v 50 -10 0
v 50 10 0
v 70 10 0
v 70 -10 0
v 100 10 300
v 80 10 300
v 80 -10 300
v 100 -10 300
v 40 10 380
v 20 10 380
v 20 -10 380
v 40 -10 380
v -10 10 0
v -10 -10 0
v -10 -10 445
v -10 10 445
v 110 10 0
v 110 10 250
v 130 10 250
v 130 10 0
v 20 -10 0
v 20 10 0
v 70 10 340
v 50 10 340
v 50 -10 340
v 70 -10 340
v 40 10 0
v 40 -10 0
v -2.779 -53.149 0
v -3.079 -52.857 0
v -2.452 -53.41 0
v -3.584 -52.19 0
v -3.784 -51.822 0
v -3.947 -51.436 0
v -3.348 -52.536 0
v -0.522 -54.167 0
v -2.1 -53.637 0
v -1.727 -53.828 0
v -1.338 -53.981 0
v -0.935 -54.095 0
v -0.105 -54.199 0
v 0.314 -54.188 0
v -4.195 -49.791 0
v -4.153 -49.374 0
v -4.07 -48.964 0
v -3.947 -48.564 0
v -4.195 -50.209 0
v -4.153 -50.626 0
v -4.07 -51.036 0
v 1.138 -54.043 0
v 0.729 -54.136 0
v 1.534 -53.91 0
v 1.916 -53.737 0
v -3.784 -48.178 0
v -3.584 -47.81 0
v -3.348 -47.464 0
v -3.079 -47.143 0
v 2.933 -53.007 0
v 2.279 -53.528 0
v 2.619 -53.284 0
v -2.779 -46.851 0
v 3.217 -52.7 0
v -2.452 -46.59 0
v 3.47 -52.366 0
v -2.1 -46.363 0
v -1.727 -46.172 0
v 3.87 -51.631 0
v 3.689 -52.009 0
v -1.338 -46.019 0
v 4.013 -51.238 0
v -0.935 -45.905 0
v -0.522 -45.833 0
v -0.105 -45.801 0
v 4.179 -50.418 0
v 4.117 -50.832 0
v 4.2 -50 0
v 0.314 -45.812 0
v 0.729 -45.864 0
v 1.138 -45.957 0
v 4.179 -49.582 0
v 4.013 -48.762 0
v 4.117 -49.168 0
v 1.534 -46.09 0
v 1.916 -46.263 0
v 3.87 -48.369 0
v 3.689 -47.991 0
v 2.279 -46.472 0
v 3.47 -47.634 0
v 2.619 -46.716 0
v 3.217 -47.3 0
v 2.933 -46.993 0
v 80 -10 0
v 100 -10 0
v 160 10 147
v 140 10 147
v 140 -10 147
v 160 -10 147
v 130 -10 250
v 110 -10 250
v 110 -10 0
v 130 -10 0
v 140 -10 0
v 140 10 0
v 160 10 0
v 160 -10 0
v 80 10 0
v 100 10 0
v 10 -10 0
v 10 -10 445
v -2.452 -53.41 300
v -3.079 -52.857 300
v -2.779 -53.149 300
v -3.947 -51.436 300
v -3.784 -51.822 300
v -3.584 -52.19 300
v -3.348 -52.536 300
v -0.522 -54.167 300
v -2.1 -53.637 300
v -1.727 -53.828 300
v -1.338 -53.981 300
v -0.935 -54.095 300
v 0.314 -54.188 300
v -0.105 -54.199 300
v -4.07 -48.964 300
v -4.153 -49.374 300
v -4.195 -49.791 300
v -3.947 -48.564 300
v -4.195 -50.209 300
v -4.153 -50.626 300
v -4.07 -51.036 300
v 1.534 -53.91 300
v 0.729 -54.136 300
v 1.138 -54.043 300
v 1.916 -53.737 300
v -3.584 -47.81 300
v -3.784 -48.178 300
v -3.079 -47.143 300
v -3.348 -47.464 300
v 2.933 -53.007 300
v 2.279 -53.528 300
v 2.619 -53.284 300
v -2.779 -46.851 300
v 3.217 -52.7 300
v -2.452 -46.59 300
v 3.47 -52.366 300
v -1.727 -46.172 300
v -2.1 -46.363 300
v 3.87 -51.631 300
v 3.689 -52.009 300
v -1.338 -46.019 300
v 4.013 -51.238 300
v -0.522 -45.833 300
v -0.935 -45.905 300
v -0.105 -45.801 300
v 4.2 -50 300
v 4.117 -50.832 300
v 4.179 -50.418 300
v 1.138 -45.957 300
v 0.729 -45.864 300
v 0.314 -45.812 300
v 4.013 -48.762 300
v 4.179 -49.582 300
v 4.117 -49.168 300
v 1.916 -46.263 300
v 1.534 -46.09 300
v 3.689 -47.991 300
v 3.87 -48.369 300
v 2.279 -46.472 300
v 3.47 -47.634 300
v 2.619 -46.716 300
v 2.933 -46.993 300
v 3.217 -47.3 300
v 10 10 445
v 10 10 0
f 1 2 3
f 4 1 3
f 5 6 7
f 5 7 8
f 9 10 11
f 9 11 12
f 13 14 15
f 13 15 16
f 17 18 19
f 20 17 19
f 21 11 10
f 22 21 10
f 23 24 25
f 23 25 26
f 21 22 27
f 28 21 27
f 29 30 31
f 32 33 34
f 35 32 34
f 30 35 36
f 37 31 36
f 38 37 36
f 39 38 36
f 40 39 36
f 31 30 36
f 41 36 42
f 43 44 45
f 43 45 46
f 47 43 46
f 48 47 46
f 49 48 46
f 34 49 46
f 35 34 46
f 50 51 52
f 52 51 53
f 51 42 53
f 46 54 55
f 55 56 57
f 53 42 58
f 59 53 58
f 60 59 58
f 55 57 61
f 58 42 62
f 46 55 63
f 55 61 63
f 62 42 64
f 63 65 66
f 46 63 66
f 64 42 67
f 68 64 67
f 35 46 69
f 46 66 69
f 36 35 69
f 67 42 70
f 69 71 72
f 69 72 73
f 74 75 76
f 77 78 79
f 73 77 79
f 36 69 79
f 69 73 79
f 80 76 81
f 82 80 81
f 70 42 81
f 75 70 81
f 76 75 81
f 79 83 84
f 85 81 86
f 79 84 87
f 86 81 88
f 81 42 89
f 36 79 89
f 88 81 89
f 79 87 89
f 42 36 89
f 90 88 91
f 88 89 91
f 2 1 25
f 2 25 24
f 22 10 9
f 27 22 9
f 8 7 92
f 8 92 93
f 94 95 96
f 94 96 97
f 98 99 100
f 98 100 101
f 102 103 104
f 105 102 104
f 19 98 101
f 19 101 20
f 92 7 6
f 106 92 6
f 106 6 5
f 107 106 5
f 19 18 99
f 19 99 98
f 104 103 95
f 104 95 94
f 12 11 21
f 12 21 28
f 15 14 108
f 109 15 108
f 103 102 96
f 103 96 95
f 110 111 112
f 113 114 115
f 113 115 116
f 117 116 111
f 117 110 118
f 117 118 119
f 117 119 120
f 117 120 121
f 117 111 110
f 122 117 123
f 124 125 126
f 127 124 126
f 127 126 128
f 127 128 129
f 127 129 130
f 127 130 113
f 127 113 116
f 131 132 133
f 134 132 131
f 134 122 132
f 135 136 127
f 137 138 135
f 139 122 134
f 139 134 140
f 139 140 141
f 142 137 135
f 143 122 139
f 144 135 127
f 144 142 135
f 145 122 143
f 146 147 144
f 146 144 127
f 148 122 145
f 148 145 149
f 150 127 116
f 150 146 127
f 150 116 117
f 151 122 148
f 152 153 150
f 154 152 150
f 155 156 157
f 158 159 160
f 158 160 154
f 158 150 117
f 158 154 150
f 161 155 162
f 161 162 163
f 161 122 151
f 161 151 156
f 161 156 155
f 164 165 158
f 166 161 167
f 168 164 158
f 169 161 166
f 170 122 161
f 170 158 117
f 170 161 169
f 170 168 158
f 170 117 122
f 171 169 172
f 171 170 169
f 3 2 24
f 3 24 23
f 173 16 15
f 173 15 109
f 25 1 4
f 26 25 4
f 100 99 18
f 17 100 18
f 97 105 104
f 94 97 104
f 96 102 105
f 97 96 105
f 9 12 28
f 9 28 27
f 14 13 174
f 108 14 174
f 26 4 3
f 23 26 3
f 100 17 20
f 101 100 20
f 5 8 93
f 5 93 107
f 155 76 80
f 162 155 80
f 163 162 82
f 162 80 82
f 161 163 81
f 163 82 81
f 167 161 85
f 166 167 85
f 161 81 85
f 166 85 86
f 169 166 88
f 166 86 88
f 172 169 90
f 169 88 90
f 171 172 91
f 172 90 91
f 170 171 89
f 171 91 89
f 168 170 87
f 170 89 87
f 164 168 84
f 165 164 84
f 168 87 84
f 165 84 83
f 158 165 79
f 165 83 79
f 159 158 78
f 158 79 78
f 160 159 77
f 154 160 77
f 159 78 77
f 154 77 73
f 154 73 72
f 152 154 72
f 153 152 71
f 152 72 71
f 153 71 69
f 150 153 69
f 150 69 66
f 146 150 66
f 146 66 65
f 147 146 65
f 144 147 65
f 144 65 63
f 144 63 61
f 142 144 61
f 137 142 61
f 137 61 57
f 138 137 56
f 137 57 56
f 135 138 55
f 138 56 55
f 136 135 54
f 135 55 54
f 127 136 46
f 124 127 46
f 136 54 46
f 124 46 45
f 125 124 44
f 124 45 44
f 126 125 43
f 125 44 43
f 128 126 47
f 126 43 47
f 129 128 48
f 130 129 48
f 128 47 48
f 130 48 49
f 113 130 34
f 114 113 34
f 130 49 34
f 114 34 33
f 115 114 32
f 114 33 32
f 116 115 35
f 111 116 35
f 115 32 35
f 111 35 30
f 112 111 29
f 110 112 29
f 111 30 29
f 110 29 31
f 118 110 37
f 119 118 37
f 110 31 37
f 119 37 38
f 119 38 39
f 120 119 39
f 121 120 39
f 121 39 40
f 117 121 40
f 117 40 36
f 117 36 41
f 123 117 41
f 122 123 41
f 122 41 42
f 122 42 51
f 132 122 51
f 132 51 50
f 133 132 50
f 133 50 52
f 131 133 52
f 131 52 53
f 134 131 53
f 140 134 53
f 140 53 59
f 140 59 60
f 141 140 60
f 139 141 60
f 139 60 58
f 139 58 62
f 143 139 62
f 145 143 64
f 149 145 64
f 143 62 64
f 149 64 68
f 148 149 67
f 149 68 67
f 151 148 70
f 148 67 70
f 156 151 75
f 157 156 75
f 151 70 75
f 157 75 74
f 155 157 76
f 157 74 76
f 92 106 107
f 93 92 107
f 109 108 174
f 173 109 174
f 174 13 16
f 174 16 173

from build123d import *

# Parameters (mm, degrees)
F0_W     = 20
F0_H     = 20
F1_DEPTH = 445
F2_DEPTH = 380
F3_DEPTH = 340
F4_DEPTH = 300
F0_R     = 4.2
F5_DEPTH = 300
F6_DEPTH = 250
F7_DEPTH = 147


with BuildPart() as f1:
    # F0 (on Top) → F1 (new body)
    with BuildSketch(Plane.XY):
        Rectangle(F0_W, F0_H)
    extrude(amount=F1_DEPTH)


with BuildPart() as f2:
    # F0 (on Top) → F2 (new body)
    with BuildSketch(Plane.XY):
        with Locations((30, 0)):
            Rectangle(F0_W, F0_H)
    extrude(amount=F2_DEPTH)


with BuildPart() as f3:
    # F0 (on Top) → F3 (new body)
    with BuildSketch(Plane.XY):
        with Locations((60, 0)):
            Rectangle(F0_W, F0_H)
    extrude(amount=F3_DEPTH)


with BuildPart() as f4:
    # F0 (on Top) → F4 (new body)
    with BuildSketch(Plane.XY):
        with Locations((90, 0)):
            Rectangle(F0_W, F0_H)
    extrude(amount=F4_DEPTH)


with BuildPart() as f5:
    # F0 (on Top) → F5 (new body)
    with BuildSketch(Plane.XY):
        with Locations((0, -50)):
            Circle(F0_R)
    extrude(amount=F5_DEPTH)


with BuildPart() as f6:
    # F0 (on Top) → F6 (new body)
    with BuildSketch(Plane.XY):
        with Locations((120, 0)):
            Rectangle(F0_W, F0_H)
    extrude(amount=F6_DEPTH)


with BuildPart() as f7:
    # F0 (on Top) → F7 (new body)
    with BuildSketch(Plane.XY):
        with Locations((150, 0)):
            Rectangle(F0_W, F0_H)
    extrude(amount=F7_DEPTH)


solid = Compound([f1.part, f2.part, f3.part, f4.part, f5.part, f6.part, f7.part])
